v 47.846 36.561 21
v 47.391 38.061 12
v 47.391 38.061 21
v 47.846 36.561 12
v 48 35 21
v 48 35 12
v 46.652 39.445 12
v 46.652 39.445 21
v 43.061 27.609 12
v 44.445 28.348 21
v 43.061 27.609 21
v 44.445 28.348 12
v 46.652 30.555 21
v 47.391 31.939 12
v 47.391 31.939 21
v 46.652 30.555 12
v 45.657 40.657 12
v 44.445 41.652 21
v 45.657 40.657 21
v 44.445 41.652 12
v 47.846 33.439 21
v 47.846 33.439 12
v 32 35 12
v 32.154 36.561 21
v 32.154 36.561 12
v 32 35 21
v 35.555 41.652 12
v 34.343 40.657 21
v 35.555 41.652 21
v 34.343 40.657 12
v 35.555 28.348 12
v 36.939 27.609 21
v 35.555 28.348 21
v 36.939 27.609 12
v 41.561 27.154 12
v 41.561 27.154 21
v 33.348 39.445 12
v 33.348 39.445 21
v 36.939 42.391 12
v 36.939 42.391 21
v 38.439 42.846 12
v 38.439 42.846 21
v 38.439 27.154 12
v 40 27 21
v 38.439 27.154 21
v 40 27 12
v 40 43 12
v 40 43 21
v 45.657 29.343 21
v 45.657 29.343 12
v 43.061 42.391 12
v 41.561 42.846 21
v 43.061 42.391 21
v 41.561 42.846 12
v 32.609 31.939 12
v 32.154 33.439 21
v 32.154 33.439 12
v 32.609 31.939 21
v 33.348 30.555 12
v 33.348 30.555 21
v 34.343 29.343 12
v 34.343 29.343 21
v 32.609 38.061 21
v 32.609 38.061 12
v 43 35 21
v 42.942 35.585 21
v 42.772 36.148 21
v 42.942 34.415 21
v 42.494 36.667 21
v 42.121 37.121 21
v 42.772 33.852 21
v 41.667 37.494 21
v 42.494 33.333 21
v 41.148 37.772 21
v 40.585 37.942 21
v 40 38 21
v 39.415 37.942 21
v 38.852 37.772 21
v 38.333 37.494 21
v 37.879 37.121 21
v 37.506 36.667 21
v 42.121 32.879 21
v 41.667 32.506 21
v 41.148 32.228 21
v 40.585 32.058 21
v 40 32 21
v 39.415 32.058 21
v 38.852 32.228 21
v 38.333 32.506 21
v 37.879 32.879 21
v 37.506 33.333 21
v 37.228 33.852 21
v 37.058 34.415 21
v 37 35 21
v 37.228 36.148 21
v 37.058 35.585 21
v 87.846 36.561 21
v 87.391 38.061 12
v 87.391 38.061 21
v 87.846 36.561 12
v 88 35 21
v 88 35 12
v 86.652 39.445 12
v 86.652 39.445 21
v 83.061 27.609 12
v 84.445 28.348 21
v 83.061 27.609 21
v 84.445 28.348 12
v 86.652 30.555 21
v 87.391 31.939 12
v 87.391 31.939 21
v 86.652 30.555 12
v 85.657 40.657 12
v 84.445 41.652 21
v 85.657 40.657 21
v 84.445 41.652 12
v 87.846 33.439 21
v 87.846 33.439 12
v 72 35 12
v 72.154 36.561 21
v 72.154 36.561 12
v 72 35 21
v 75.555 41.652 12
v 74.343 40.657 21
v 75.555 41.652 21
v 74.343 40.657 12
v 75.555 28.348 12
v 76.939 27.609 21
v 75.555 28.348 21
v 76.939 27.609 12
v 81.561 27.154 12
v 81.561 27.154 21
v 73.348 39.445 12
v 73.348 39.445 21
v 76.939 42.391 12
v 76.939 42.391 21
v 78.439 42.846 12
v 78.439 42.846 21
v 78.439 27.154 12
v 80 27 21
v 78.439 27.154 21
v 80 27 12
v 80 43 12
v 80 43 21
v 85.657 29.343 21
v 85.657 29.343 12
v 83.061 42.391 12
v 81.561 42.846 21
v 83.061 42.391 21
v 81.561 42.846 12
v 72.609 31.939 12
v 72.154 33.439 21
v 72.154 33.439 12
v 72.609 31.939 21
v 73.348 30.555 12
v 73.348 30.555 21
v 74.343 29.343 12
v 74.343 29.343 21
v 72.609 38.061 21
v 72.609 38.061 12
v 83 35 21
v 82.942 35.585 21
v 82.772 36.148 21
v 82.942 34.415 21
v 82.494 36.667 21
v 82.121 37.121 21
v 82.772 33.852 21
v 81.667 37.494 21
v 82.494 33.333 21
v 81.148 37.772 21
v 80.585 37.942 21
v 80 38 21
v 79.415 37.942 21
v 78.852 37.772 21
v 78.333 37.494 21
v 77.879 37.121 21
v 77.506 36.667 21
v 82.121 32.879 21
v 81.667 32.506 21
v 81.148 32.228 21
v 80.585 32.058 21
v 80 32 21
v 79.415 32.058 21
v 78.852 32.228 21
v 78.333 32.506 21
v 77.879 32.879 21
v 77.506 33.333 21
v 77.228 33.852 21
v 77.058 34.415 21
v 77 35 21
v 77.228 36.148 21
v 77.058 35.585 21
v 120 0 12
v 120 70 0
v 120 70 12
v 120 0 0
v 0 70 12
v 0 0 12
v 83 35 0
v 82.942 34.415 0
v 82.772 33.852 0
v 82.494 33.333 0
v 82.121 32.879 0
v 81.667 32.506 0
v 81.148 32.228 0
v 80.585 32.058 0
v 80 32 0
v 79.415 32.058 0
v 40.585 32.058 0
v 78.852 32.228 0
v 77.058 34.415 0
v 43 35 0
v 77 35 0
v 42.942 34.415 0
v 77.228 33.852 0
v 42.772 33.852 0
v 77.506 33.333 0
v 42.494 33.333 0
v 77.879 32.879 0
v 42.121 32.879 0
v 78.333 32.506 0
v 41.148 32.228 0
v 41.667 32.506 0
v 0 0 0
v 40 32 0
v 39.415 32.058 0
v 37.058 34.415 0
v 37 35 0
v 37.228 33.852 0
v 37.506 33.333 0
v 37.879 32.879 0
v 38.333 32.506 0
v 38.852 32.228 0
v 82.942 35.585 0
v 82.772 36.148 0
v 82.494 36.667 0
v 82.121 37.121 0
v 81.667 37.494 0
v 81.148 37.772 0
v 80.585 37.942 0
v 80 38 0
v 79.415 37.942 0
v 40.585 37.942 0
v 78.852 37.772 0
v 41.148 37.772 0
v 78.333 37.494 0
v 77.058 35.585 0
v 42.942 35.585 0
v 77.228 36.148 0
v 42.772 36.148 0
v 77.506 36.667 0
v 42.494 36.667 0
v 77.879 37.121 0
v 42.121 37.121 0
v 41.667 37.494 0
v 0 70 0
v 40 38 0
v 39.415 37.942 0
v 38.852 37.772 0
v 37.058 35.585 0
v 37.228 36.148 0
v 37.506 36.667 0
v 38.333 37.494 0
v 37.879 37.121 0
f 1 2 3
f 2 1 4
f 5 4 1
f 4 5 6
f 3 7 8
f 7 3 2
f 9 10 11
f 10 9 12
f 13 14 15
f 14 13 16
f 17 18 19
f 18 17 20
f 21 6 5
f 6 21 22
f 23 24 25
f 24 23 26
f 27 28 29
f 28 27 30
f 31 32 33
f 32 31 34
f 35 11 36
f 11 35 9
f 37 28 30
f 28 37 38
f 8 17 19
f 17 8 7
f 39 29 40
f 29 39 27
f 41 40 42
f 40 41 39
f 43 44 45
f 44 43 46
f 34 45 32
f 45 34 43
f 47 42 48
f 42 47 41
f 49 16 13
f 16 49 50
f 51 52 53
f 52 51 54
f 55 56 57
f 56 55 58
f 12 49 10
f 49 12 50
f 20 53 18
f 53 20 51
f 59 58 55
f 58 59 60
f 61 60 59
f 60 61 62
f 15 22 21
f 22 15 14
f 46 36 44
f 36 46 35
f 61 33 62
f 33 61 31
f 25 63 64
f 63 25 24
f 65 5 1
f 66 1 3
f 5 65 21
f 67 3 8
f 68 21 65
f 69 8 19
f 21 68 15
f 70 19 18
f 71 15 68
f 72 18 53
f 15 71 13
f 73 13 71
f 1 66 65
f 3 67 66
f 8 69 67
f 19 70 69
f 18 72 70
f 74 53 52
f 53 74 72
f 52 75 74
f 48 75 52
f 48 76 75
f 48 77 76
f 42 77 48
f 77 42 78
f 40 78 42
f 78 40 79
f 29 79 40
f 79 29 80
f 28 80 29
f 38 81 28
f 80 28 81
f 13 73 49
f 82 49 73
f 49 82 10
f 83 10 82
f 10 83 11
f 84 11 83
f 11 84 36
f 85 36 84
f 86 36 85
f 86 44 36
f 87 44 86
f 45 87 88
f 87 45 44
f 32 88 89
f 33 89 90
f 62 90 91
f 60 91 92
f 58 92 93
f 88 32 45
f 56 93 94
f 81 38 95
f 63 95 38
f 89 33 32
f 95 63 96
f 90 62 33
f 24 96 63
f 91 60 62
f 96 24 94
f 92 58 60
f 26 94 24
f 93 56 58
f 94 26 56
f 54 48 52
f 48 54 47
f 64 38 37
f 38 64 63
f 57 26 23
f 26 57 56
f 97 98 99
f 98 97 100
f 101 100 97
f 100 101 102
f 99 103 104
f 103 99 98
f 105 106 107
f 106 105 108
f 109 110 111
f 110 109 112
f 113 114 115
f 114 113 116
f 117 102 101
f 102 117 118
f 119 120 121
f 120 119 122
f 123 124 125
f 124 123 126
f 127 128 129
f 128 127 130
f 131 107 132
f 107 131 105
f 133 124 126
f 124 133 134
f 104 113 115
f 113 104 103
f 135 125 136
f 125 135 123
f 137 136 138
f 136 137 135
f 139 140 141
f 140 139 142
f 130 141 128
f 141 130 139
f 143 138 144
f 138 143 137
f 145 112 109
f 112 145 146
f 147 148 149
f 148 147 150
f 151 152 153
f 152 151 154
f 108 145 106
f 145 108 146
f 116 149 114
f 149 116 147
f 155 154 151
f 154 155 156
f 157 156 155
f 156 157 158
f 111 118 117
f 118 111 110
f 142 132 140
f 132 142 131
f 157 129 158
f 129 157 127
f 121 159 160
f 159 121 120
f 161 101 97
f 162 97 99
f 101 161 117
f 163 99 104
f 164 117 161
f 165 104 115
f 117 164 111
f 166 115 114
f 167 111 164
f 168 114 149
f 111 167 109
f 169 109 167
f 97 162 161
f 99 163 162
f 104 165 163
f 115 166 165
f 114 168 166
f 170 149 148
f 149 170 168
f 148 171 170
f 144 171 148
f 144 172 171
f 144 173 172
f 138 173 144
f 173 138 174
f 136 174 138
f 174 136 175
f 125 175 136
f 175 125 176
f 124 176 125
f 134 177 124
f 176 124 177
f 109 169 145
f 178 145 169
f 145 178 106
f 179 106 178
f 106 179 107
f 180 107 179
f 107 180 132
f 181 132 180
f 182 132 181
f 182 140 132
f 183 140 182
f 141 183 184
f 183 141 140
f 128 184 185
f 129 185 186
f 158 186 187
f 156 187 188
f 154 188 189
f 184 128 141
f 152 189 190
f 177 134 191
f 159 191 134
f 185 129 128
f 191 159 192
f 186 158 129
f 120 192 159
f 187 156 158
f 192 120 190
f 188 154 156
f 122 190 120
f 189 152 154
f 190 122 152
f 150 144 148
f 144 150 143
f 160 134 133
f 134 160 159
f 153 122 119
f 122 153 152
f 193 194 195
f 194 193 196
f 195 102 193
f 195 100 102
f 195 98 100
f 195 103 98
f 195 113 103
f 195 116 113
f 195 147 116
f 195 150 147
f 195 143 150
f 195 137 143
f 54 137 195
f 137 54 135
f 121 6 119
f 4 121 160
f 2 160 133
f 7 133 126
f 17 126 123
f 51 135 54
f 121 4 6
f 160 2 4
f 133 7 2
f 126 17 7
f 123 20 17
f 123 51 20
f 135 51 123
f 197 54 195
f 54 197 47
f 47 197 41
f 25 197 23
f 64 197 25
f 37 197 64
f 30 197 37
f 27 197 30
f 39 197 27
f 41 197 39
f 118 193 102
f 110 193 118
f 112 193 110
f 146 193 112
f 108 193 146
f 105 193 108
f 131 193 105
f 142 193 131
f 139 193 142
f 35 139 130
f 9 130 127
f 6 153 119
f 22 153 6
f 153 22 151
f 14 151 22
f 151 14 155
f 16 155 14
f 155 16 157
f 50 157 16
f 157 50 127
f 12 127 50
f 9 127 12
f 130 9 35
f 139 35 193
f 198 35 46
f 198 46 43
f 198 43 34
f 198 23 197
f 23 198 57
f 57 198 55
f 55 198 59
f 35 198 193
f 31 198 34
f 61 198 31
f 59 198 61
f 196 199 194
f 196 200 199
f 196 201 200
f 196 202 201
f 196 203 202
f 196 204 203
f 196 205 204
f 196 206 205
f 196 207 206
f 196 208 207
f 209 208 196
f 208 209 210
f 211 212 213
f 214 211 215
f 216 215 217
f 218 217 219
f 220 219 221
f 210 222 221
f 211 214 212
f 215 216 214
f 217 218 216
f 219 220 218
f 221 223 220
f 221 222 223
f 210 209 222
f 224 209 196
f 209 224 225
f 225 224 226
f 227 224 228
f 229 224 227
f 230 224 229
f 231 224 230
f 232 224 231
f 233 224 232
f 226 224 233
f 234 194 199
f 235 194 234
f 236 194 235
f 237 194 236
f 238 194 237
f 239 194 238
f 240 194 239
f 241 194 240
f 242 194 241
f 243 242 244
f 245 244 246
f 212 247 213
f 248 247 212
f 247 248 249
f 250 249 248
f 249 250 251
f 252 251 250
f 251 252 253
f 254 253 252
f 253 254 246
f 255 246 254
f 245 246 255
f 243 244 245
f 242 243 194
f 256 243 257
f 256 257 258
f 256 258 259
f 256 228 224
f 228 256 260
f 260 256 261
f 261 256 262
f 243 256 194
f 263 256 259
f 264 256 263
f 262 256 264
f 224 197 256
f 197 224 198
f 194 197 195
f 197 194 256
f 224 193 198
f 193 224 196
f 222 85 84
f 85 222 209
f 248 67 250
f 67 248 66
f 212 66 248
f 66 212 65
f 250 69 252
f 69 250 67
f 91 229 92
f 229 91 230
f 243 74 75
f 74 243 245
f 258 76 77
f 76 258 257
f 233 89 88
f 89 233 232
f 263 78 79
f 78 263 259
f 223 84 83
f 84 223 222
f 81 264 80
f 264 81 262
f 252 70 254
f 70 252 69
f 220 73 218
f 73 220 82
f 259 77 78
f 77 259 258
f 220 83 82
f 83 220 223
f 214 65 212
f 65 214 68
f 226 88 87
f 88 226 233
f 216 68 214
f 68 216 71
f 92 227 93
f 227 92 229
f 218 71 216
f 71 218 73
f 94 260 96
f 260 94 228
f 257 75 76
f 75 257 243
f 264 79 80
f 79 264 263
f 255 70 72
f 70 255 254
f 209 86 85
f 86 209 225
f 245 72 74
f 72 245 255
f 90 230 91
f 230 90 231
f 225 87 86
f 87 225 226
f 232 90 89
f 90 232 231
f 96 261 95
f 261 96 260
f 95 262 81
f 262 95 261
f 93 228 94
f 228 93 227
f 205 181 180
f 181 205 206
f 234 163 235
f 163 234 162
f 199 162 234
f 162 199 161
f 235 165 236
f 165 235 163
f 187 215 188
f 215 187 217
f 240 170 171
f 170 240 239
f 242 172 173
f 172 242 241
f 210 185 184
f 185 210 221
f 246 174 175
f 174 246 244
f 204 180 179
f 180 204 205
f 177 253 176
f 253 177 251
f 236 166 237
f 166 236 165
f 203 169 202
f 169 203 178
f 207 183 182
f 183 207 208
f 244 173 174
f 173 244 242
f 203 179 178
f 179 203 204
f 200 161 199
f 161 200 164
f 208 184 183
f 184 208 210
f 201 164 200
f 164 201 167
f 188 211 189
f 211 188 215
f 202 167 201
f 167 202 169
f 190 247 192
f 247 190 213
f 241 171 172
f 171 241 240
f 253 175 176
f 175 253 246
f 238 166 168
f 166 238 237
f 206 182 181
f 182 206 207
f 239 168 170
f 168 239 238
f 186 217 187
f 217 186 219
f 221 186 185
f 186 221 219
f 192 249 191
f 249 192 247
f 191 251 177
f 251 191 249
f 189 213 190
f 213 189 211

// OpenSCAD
$fn = 32;

// ----------------------------------------------------------------------
// Drill jig: two_boss jig
// ----------------------------------------------------------------------

// --- parameters (mm) ---
plate_l = 120;            // plate length, X
plate_w = 70;             // plate width, Y
plate_t = 12;             // plate thickness
boss_d = 16;              // guide boss diameter
boss_h = 10;              // boss height above the plate
guide_d = 6;              // guide hole diameter
boss_pitch = 40;          // boss pitch
fit_tol = 0.1;            // tolerance for press fits, mm
free_tol = 0.3;           // tolerance for clearance fits, mm

n_boss = 2;  // guide bosses
boss_x0 = (plate_l - (n_boss - 1) * boss_pitch) / 2;  // first boss X
boss_top = plate_t - 1 + boss_h;  // boss crown height
total_h = boss_top;  // overall height

difference() {
  union() {
  cube([plate_l, plate_w, plate_t]);
  for (i = [0 : n_boss - 1])
    translate([boss_x0 + i * boss_pitch, plate_w / 2, plate_t - 1])
      cylinder(h = boss_h, d = boss_d);
  }
  for (i = [0 : n_boss - 1])
    translate([boss_x0 + i * boss_pitch, plate_w / 2, -1])
      cylinder(h = plate_t + boss_h, d = guide_d);
}
